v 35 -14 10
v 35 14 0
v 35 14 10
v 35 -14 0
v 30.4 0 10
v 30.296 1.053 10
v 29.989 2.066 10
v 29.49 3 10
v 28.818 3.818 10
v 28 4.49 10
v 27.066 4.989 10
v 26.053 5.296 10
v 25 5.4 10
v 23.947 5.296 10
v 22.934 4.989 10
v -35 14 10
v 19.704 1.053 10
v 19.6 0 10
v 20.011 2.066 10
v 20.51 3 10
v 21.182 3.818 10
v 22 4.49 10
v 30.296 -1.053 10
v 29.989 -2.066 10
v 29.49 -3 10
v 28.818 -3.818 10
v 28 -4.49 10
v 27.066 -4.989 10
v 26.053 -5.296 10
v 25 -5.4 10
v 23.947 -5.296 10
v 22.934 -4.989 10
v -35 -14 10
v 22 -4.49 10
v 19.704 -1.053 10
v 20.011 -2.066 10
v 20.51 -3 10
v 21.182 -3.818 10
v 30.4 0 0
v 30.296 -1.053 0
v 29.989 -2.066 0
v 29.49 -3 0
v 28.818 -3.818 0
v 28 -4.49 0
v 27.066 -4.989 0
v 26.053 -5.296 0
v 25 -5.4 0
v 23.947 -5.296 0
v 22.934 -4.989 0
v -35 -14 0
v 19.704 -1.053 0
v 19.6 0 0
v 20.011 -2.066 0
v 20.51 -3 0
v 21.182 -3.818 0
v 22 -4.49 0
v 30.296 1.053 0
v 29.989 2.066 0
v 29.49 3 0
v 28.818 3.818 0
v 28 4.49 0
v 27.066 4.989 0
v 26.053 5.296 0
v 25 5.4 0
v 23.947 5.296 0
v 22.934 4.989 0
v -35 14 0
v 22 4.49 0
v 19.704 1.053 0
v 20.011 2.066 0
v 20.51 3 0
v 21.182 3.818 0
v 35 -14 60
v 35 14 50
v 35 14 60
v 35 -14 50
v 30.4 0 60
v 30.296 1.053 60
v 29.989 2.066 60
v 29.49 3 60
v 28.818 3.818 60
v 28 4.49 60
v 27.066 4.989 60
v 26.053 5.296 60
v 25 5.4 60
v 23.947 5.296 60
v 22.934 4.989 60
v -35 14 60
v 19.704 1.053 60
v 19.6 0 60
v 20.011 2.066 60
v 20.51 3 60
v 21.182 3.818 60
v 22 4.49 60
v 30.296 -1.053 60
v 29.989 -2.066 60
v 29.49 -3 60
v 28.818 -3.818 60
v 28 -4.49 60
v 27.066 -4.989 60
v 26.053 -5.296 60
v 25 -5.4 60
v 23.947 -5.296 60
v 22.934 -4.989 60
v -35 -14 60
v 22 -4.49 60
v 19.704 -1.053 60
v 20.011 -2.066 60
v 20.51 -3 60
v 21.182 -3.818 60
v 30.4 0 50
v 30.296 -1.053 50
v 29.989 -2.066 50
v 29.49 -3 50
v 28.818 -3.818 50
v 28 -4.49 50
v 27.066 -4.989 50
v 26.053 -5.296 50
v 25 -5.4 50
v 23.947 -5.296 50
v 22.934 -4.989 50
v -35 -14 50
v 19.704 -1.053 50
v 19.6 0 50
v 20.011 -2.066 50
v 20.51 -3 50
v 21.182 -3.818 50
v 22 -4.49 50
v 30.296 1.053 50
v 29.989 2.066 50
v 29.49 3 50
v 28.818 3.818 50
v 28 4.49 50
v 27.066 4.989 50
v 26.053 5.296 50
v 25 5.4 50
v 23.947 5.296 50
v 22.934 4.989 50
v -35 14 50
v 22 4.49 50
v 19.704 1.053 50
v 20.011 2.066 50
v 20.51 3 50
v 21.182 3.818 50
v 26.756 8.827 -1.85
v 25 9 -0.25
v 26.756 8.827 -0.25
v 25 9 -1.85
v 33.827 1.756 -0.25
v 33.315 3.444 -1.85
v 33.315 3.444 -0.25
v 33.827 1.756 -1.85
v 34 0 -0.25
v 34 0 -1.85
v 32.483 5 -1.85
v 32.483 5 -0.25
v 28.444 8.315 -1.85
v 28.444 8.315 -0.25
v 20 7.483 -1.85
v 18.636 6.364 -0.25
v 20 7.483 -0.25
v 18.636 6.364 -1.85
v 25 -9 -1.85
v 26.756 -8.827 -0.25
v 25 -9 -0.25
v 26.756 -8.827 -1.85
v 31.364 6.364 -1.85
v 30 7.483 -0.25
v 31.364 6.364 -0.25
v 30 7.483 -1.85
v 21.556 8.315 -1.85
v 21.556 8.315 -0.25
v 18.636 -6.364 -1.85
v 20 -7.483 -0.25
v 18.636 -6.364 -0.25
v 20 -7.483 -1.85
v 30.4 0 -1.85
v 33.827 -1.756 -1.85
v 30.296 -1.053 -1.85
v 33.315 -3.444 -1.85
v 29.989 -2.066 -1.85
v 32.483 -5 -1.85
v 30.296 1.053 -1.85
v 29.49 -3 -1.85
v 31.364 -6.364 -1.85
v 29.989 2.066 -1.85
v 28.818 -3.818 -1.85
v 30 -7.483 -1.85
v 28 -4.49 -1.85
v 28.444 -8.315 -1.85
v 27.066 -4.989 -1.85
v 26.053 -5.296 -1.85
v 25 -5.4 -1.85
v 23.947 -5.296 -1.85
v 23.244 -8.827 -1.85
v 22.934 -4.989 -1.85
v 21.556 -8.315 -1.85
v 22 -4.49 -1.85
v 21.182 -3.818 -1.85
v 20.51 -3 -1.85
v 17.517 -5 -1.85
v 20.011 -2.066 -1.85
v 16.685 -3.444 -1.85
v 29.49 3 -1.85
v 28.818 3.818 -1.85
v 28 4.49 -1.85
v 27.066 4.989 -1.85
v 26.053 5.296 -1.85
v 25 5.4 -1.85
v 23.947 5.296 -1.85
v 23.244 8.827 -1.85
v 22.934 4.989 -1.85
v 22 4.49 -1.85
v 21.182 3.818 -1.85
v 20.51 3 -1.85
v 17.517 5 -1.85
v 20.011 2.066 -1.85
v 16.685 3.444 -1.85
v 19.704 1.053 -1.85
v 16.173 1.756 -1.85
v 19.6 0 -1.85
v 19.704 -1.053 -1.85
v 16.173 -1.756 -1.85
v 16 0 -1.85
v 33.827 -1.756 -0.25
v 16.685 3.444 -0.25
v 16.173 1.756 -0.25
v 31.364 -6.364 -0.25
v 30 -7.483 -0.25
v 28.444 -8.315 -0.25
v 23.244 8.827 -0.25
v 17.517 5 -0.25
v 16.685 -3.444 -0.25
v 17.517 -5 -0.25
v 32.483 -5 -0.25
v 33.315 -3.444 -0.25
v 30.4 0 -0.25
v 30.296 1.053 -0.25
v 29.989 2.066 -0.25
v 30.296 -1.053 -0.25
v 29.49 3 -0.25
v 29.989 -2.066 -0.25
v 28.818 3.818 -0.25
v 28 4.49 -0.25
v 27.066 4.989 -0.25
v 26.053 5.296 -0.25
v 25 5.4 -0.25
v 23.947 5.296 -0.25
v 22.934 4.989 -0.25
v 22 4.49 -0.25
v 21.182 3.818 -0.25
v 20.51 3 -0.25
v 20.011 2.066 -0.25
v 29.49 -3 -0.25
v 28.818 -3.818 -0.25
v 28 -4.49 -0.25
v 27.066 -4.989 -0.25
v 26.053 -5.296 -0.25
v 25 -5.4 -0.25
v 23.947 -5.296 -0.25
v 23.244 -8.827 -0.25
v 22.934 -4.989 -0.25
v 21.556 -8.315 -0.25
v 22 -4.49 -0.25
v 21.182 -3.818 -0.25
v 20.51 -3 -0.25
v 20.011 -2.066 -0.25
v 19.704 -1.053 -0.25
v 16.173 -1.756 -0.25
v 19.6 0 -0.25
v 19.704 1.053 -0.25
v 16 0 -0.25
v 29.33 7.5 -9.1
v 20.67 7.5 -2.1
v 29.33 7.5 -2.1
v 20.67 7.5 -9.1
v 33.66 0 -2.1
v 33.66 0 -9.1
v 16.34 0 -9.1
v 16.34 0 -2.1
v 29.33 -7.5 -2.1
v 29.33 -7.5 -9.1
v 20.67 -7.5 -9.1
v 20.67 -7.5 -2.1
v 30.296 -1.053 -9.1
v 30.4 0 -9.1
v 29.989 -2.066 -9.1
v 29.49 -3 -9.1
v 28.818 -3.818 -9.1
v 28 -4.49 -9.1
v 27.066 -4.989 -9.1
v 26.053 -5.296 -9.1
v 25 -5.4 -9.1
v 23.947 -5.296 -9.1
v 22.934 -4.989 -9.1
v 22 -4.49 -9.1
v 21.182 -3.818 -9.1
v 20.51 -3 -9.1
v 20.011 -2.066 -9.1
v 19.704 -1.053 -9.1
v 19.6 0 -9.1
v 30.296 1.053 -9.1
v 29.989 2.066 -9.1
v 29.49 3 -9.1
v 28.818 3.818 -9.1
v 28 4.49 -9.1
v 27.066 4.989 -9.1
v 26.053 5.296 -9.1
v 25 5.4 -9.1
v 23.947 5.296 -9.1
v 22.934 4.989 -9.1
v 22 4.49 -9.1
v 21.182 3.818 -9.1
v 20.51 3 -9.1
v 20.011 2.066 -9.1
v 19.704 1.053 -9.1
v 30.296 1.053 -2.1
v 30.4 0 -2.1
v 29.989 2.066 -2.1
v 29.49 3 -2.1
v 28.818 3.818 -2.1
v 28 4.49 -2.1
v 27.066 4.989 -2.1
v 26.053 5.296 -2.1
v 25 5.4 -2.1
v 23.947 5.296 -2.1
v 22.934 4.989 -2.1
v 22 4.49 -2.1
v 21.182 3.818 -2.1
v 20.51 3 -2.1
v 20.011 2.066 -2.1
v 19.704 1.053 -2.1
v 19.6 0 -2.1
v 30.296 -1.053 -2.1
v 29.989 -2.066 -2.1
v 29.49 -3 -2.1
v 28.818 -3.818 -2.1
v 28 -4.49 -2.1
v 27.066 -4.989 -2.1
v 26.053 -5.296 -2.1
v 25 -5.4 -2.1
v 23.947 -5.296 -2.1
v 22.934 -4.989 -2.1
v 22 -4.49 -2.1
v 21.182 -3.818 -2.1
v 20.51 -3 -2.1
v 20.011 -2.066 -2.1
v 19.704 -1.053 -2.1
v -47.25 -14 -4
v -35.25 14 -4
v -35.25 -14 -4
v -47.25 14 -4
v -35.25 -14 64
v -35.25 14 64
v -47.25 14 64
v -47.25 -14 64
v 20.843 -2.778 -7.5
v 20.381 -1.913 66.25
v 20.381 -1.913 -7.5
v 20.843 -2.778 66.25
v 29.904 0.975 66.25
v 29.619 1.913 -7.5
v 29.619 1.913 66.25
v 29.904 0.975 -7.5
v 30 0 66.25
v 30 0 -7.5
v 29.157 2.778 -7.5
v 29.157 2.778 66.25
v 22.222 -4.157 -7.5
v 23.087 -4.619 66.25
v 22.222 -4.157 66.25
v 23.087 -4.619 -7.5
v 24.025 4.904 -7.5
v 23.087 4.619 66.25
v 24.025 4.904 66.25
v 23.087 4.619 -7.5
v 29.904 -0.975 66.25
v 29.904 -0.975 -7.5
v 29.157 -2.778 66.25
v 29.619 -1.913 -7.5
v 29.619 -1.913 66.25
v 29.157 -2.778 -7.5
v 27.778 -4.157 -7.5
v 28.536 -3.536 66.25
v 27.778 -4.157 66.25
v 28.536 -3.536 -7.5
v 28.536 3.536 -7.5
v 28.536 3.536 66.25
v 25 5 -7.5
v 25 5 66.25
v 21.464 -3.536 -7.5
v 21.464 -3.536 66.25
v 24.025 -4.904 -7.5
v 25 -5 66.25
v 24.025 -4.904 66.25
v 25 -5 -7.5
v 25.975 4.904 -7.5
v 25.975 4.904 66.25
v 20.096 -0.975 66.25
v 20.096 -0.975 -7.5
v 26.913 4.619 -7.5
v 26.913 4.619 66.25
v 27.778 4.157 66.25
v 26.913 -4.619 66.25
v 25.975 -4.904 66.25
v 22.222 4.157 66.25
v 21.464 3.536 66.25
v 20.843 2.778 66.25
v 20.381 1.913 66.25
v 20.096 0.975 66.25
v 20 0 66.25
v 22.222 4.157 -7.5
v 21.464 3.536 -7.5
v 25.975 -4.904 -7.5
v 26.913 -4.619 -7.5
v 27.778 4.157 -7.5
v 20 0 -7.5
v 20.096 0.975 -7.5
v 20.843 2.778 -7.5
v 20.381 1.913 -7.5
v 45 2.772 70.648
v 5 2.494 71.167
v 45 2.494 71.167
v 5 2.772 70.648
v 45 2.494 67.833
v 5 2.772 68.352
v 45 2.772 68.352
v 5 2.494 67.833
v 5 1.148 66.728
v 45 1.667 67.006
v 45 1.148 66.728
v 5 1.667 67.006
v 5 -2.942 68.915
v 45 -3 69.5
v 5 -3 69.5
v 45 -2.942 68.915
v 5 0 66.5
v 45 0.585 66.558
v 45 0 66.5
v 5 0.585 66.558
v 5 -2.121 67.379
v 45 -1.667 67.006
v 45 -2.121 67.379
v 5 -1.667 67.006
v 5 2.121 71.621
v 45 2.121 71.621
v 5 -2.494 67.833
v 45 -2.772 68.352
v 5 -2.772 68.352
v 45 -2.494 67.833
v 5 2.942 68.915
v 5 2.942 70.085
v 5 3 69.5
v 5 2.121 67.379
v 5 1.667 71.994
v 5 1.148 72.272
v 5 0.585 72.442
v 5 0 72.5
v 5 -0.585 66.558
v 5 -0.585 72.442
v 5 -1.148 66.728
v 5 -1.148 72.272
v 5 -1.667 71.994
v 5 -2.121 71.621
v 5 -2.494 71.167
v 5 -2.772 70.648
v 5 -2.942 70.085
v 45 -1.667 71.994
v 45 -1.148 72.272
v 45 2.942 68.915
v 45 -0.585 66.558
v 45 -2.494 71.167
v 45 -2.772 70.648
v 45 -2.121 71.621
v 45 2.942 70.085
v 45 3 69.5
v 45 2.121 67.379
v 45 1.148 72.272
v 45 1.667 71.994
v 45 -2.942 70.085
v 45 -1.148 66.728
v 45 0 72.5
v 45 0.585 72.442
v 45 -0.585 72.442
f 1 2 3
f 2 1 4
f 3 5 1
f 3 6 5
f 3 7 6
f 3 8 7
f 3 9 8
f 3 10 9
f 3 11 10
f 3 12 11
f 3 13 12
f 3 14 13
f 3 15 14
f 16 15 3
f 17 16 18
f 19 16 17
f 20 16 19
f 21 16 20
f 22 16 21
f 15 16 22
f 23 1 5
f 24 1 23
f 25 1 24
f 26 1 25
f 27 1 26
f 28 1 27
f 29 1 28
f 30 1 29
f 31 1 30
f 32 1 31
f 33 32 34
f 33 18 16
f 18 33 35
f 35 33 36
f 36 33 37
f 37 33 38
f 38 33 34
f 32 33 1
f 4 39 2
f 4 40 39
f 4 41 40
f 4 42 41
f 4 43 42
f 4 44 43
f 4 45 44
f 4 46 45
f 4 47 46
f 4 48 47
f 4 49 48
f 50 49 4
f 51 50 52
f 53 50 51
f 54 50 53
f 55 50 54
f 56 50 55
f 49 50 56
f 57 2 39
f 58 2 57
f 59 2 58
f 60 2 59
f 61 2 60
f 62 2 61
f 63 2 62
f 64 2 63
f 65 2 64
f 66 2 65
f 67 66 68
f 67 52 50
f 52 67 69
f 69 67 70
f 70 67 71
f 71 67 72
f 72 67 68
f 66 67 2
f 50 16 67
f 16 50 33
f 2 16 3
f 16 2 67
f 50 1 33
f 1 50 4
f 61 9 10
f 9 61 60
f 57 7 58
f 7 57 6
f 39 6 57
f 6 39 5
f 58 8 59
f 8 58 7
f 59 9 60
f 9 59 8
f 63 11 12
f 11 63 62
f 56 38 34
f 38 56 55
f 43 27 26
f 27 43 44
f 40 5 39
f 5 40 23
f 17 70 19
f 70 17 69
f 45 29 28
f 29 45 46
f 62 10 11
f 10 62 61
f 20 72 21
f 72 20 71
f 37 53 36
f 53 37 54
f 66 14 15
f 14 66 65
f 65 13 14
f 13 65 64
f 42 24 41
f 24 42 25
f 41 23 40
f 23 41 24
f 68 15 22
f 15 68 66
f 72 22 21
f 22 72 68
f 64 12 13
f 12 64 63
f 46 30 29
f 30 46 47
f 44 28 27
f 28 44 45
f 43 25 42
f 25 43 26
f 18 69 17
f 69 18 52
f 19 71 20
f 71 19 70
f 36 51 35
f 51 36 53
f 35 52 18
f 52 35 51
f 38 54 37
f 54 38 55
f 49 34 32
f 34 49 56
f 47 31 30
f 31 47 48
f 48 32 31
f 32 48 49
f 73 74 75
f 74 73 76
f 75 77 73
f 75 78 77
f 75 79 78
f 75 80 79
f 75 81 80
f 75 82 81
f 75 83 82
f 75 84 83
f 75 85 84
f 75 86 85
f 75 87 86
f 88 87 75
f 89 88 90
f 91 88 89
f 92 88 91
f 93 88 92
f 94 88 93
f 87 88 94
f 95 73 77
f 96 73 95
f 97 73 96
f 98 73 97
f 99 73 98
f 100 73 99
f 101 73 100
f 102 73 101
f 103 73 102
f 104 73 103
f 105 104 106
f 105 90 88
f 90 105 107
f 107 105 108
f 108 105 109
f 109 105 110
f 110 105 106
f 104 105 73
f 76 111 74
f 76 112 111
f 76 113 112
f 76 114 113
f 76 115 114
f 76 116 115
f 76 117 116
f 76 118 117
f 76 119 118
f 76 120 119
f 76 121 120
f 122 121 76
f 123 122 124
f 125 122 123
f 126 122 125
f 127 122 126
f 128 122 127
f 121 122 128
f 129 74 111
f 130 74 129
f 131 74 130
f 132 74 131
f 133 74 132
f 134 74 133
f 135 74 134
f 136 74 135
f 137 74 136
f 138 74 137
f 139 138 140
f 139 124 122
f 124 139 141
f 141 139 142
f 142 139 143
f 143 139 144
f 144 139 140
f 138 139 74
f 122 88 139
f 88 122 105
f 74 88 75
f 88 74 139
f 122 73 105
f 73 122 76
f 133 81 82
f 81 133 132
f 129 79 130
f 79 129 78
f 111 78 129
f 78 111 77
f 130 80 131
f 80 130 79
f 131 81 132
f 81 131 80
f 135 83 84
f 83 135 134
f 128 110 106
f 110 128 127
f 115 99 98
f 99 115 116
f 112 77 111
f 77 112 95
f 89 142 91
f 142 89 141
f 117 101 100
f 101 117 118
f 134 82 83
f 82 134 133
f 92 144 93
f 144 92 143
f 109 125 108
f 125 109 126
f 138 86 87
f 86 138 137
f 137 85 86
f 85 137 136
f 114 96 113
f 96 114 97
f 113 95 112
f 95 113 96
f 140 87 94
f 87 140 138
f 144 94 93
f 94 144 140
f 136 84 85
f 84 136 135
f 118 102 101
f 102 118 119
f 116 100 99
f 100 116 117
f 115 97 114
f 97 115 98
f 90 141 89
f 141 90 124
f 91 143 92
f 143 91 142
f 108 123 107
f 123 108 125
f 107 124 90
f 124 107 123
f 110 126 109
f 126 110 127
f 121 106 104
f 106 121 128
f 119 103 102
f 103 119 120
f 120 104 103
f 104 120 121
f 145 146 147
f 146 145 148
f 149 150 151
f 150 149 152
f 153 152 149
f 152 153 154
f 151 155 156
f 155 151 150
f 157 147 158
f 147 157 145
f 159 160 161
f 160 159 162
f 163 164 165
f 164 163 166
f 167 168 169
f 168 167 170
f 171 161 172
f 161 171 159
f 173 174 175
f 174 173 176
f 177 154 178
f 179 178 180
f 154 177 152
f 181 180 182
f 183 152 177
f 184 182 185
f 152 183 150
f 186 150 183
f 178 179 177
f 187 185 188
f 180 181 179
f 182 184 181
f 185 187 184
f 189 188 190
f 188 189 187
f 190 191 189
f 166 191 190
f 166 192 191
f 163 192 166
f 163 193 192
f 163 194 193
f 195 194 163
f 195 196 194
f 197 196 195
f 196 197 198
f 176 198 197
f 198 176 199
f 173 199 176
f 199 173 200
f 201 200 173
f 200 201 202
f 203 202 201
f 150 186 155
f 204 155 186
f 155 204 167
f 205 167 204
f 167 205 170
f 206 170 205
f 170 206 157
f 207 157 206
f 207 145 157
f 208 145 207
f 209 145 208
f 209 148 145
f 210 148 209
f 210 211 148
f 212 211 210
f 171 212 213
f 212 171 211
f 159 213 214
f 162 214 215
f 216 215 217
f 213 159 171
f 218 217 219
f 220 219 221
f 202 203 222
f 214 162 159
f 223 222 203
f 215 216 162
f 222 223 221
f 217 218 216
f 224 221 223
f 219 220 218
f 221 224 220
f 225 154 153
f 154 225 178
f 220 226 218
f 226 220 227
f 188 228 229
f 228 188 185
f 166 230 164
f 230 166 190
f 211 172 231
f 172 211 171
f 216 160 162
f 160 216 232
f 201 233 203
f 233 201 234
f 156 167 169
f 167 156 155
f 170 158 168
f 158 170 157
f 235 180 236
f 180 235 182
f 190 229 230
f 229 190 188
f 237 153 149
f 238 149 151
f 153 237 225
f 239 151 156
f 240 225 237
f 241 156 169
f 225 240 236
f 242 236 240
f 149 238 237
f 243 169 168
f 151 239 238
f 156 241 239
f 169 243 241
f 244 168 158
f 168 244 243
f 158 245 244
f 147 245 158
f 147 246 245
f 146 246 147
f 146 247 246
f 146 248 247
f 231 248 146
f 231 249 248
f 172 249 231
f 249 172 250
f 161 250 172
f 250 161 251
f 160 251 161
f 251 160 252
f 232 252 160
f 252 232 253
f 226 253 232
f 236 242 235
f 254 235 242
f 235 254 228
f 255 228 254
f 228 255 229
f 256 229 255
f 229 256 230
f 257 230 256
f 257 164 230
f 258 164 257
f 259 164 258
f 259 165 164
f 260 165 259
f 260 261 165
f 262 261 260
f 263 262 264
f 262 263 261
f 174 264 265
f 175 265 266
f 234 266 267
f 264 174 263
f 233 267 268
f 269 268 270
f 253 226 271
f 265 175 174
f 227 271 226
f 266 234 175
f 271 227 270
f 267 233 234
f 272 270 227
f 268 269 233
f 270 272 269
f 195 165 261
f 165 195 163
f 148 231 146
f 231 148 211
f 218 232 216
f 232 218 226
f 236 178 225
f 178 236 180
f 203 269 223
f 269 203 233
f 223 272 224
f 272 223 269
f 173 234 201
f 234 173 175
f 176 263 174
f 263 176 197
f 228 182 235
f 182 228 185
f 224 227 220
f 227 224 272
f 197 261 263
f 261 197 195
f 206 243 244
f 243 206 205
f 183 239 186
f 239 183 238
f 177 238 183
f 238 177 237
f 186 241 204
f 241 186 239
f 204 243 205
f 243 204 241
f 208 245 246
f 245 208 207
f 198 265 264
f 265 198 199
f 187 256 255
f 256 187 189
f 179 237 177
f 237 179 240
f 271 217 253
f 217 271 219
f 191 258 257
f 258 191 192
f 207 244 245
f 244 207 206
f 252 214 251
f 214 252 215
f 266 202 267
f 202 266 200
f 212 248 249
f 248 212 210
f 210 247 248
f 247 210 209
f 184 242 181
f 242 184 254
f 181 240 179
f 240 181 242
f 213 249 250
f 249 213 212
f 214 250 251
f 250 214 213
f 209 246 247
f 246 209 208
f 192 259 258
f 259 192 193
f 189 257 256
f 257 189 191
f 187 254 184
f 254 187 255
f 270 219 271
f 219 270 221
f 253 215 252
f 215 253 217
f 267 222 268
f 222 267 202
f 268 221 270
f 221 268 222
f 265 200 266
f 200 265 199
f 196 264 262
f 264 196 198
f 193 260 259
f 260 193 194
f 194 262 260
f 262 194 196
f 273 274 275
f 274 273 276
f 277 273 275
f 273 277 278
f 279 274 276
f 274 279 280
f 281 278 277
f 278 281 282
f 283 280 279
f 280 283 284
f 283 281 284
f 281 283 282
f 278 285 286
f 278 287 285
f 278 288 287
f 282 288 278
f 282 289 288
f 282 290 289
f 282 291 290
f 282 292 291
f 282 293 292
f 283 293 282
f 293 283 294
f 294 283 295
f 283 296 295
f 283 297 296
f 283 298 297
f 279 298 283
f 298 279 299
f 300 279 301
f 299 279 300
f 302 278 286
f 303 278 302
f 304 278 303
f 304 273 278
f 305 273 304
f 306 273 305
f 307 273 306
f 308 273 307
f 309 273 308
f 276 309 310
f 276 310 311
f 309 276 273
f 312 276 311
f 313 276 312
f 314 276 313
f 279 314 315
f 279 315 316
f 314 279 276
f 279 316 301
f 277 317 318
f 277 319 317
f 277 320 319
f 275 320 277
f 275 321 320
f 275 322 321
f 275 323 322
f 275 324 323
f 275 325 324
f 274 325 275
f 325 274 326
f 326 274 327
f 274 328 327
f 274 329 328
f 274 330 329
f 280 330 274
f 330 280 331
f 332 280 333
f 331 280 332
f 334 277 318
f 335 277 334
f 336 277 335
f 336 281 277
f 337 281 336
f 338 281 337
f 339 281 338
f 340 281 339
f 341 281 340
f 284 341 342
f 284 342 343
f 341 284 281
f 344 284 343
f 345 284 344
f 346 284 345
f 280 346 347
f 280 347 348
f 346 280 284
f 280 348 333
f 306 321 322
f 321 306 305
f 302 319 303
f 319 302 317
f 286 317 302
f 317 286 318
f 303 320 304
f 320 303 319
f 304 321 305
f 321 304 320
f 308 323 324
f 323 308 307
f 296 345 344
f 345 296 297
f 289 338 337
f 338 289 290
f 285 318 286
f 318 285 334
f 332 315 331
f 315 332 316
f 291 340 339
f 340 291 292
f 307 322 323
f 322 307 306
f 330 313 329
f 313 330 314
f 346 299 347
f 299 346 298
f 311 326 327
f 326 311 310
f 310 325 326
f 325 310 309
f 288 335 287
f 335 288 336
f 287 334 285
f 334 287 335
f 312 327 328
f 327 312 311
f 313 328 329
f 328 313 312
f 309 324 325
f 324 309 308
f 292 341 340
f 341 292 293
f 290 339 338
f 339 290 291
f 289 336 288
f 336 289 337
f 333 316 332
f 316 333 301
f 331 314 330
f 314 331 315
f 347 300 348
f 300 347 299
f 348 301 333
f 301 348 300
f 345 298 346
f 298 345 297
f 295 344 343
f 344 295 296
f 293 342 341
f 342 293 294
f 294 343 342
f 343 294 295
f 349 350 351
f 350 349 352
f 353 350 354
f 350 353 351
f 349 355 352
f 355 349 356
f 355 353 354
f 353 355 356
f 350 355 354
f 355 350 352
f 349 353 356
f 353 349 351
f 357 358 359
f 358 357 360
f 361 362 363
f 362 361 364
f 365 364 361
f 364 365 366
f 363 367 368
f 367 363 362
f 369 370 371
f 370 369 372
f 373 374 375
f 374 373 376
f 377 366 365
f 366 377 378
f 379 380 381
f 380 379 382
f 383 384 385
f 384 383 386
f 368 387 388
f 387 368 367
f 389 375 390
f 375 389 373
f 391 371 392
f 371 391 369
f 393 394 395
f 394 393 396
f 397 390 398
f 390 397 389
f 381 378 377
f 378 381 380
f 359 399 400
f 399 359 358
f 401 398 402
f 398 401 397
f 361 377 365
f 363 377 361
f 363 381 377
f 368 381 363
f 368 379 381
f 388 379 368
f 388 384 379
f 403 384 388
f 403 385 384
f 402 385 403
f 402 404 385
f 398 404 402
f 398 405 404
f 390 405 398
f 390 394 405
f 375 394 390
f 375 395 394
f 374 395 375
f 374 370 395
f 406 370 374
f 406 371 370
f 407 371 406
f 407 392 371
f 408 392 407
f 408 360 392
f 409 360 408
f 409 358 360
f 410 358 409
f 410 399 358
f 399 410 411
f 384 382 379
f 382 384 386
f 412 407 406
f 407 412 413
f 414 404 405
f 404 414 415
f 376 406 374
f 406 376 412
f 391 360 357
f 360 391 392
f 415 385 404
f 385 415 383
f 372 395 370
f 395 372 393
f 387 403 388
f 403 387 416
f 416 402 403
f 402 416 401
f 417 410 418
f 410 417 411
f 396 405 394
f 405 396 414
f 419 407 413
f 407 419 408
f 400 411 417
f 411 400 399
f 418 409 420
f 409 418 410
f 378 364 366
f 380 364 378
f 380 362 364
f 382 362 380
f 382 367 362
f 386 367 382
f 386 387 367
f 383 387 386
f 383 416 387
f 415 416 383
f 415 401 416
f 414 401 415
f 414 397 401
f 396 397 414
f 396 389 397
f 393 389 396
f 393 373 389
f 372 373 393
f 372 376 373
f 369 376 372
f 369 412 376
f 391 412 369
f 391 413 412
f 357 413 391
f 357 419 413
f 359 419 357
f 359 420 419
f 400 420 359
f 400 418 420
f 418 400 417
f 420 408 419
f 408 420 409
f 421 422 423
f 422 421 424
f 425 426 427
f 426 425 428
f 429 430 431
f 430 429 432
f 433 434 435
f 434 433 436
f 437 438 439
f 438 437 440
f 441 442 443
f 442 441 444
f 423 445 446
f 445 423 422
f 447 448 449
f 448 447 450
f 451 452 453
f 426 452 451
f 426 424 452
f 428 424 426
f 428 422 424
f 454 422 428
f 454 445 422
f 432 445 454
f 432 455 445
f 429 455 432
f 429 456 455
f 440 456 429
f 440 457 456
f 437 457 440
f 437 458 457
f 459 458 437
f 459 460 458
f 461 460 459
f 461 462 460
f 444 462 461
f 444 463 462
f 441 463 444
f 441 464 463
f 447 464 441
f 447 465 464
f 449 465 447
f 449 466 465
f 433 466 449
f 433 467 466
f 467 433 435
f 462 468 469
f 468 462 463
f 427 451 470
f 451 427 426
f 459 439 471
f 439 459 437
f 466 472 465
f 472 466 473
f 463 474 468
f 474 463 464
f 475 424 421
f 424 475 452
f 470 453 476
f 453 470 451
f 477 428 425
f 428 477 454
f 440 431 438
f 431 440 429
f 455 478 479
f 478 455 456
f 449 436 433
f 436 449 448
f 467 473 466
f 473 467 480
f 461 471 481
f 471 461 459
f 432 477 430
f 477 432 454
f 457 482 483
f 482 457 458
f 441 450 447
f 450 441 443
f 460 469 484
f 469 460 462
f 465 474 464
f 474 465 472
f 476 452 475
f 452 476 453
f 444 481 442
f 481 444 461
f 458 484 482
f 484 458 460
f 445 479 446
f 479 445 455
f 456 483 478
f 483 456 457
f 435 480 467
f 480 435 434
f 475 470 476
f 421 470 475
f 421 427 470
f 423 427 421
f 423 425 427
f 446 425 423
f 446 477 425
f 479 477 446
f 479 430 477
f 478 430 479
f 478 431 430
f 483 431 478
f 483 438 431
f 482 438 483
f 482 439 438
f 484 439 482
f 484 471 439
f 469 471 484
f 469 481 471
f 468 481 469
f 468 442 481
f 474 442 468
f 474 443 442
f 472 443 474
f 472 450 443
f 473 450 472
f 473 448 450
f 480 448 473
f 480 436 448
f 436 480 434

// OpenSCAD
$fn = 32;

// ------------------------------------------------------------------------
// C clamp: throat 50 mm, screw d10
// Every part is its own module, assembly() places every instance.
// ------------------------------------------------------------------------

// --- part 1 ---
module clamp_arm() {
  difference() {
    translate([-35, -14, 0]) cube([70, 28, 10]);
    translate([25, 0, -1]) cylinder(h = 12, d = 10.8);
  }
}

// --- part 2 ---
module clamp_spine() {
  difference() {
    translate([-34, -14, 0]) cube([68, 28, 12]);
  }
}

// --- part 3 ---
module clamp_screw() {
  translate([0, 0, -36.875]) cylinder(h = 73.75, d = 10);
}

// --- part 4 ---
module clamp_washer() {
  difference() {
      translate([0, 0, 0]) cylinder(h = 1.6, d = 18);
      translate([0, 0, -1]) cylinder(h = 3.6, d = 10.8);
    }
}

// --- part 5 ---
module clamp_nut() {
  difference() {
    linear_extrude(height = 7) polygon(points = [[8.66, 0], [4.33, 7.5], [-4.33, 7.5], [-8.66, 0], [-4.33, -7.5], [4.33, -7.5]]);
    translate([0, 0, -1]) cylinder(h = 9, d = 10.8);
  }
}

// --- part 6 ---
module tommy_bar() {
  translate([0, 0, -20]) cylinder(h = 40, d = 6);
}

// --- assembly ---
module assembly() {
  color([0.80, 0.24, 0.20]) translate([0, 0, 0]) rotate([0, 0, 0]) clamp_arm();
  color([0.20, 0.45, 0.75]) translate([0, 0, 50]) rotate([0, 0, 0]) clamp_arm();
  color([0.25, 0.62, 0.32]) translate([-47.25, 0, 30]) rotate([0, 90, 0]) clamp_spine();
  color([0.92, 0.70, 0.18]) translate([25, 0, 29.375]) rotate([0, 0, 0]) clamp_screw();
  color([0.58, 0.35, 0.70]) translate([25, 0, -1.85]) rotate([0, 0, 0]) clamp_washer();
  color([0.16, 0.66, 0.66]) translate([25, 0, -9.1]) rotate([0, 0, 0]) clamp_nut();
  color([0.85, 0.48, 0.18]) translate([25, 0, 69.5]) rotate([0, 90, 0]) tommy_bar();
}

assembly();
